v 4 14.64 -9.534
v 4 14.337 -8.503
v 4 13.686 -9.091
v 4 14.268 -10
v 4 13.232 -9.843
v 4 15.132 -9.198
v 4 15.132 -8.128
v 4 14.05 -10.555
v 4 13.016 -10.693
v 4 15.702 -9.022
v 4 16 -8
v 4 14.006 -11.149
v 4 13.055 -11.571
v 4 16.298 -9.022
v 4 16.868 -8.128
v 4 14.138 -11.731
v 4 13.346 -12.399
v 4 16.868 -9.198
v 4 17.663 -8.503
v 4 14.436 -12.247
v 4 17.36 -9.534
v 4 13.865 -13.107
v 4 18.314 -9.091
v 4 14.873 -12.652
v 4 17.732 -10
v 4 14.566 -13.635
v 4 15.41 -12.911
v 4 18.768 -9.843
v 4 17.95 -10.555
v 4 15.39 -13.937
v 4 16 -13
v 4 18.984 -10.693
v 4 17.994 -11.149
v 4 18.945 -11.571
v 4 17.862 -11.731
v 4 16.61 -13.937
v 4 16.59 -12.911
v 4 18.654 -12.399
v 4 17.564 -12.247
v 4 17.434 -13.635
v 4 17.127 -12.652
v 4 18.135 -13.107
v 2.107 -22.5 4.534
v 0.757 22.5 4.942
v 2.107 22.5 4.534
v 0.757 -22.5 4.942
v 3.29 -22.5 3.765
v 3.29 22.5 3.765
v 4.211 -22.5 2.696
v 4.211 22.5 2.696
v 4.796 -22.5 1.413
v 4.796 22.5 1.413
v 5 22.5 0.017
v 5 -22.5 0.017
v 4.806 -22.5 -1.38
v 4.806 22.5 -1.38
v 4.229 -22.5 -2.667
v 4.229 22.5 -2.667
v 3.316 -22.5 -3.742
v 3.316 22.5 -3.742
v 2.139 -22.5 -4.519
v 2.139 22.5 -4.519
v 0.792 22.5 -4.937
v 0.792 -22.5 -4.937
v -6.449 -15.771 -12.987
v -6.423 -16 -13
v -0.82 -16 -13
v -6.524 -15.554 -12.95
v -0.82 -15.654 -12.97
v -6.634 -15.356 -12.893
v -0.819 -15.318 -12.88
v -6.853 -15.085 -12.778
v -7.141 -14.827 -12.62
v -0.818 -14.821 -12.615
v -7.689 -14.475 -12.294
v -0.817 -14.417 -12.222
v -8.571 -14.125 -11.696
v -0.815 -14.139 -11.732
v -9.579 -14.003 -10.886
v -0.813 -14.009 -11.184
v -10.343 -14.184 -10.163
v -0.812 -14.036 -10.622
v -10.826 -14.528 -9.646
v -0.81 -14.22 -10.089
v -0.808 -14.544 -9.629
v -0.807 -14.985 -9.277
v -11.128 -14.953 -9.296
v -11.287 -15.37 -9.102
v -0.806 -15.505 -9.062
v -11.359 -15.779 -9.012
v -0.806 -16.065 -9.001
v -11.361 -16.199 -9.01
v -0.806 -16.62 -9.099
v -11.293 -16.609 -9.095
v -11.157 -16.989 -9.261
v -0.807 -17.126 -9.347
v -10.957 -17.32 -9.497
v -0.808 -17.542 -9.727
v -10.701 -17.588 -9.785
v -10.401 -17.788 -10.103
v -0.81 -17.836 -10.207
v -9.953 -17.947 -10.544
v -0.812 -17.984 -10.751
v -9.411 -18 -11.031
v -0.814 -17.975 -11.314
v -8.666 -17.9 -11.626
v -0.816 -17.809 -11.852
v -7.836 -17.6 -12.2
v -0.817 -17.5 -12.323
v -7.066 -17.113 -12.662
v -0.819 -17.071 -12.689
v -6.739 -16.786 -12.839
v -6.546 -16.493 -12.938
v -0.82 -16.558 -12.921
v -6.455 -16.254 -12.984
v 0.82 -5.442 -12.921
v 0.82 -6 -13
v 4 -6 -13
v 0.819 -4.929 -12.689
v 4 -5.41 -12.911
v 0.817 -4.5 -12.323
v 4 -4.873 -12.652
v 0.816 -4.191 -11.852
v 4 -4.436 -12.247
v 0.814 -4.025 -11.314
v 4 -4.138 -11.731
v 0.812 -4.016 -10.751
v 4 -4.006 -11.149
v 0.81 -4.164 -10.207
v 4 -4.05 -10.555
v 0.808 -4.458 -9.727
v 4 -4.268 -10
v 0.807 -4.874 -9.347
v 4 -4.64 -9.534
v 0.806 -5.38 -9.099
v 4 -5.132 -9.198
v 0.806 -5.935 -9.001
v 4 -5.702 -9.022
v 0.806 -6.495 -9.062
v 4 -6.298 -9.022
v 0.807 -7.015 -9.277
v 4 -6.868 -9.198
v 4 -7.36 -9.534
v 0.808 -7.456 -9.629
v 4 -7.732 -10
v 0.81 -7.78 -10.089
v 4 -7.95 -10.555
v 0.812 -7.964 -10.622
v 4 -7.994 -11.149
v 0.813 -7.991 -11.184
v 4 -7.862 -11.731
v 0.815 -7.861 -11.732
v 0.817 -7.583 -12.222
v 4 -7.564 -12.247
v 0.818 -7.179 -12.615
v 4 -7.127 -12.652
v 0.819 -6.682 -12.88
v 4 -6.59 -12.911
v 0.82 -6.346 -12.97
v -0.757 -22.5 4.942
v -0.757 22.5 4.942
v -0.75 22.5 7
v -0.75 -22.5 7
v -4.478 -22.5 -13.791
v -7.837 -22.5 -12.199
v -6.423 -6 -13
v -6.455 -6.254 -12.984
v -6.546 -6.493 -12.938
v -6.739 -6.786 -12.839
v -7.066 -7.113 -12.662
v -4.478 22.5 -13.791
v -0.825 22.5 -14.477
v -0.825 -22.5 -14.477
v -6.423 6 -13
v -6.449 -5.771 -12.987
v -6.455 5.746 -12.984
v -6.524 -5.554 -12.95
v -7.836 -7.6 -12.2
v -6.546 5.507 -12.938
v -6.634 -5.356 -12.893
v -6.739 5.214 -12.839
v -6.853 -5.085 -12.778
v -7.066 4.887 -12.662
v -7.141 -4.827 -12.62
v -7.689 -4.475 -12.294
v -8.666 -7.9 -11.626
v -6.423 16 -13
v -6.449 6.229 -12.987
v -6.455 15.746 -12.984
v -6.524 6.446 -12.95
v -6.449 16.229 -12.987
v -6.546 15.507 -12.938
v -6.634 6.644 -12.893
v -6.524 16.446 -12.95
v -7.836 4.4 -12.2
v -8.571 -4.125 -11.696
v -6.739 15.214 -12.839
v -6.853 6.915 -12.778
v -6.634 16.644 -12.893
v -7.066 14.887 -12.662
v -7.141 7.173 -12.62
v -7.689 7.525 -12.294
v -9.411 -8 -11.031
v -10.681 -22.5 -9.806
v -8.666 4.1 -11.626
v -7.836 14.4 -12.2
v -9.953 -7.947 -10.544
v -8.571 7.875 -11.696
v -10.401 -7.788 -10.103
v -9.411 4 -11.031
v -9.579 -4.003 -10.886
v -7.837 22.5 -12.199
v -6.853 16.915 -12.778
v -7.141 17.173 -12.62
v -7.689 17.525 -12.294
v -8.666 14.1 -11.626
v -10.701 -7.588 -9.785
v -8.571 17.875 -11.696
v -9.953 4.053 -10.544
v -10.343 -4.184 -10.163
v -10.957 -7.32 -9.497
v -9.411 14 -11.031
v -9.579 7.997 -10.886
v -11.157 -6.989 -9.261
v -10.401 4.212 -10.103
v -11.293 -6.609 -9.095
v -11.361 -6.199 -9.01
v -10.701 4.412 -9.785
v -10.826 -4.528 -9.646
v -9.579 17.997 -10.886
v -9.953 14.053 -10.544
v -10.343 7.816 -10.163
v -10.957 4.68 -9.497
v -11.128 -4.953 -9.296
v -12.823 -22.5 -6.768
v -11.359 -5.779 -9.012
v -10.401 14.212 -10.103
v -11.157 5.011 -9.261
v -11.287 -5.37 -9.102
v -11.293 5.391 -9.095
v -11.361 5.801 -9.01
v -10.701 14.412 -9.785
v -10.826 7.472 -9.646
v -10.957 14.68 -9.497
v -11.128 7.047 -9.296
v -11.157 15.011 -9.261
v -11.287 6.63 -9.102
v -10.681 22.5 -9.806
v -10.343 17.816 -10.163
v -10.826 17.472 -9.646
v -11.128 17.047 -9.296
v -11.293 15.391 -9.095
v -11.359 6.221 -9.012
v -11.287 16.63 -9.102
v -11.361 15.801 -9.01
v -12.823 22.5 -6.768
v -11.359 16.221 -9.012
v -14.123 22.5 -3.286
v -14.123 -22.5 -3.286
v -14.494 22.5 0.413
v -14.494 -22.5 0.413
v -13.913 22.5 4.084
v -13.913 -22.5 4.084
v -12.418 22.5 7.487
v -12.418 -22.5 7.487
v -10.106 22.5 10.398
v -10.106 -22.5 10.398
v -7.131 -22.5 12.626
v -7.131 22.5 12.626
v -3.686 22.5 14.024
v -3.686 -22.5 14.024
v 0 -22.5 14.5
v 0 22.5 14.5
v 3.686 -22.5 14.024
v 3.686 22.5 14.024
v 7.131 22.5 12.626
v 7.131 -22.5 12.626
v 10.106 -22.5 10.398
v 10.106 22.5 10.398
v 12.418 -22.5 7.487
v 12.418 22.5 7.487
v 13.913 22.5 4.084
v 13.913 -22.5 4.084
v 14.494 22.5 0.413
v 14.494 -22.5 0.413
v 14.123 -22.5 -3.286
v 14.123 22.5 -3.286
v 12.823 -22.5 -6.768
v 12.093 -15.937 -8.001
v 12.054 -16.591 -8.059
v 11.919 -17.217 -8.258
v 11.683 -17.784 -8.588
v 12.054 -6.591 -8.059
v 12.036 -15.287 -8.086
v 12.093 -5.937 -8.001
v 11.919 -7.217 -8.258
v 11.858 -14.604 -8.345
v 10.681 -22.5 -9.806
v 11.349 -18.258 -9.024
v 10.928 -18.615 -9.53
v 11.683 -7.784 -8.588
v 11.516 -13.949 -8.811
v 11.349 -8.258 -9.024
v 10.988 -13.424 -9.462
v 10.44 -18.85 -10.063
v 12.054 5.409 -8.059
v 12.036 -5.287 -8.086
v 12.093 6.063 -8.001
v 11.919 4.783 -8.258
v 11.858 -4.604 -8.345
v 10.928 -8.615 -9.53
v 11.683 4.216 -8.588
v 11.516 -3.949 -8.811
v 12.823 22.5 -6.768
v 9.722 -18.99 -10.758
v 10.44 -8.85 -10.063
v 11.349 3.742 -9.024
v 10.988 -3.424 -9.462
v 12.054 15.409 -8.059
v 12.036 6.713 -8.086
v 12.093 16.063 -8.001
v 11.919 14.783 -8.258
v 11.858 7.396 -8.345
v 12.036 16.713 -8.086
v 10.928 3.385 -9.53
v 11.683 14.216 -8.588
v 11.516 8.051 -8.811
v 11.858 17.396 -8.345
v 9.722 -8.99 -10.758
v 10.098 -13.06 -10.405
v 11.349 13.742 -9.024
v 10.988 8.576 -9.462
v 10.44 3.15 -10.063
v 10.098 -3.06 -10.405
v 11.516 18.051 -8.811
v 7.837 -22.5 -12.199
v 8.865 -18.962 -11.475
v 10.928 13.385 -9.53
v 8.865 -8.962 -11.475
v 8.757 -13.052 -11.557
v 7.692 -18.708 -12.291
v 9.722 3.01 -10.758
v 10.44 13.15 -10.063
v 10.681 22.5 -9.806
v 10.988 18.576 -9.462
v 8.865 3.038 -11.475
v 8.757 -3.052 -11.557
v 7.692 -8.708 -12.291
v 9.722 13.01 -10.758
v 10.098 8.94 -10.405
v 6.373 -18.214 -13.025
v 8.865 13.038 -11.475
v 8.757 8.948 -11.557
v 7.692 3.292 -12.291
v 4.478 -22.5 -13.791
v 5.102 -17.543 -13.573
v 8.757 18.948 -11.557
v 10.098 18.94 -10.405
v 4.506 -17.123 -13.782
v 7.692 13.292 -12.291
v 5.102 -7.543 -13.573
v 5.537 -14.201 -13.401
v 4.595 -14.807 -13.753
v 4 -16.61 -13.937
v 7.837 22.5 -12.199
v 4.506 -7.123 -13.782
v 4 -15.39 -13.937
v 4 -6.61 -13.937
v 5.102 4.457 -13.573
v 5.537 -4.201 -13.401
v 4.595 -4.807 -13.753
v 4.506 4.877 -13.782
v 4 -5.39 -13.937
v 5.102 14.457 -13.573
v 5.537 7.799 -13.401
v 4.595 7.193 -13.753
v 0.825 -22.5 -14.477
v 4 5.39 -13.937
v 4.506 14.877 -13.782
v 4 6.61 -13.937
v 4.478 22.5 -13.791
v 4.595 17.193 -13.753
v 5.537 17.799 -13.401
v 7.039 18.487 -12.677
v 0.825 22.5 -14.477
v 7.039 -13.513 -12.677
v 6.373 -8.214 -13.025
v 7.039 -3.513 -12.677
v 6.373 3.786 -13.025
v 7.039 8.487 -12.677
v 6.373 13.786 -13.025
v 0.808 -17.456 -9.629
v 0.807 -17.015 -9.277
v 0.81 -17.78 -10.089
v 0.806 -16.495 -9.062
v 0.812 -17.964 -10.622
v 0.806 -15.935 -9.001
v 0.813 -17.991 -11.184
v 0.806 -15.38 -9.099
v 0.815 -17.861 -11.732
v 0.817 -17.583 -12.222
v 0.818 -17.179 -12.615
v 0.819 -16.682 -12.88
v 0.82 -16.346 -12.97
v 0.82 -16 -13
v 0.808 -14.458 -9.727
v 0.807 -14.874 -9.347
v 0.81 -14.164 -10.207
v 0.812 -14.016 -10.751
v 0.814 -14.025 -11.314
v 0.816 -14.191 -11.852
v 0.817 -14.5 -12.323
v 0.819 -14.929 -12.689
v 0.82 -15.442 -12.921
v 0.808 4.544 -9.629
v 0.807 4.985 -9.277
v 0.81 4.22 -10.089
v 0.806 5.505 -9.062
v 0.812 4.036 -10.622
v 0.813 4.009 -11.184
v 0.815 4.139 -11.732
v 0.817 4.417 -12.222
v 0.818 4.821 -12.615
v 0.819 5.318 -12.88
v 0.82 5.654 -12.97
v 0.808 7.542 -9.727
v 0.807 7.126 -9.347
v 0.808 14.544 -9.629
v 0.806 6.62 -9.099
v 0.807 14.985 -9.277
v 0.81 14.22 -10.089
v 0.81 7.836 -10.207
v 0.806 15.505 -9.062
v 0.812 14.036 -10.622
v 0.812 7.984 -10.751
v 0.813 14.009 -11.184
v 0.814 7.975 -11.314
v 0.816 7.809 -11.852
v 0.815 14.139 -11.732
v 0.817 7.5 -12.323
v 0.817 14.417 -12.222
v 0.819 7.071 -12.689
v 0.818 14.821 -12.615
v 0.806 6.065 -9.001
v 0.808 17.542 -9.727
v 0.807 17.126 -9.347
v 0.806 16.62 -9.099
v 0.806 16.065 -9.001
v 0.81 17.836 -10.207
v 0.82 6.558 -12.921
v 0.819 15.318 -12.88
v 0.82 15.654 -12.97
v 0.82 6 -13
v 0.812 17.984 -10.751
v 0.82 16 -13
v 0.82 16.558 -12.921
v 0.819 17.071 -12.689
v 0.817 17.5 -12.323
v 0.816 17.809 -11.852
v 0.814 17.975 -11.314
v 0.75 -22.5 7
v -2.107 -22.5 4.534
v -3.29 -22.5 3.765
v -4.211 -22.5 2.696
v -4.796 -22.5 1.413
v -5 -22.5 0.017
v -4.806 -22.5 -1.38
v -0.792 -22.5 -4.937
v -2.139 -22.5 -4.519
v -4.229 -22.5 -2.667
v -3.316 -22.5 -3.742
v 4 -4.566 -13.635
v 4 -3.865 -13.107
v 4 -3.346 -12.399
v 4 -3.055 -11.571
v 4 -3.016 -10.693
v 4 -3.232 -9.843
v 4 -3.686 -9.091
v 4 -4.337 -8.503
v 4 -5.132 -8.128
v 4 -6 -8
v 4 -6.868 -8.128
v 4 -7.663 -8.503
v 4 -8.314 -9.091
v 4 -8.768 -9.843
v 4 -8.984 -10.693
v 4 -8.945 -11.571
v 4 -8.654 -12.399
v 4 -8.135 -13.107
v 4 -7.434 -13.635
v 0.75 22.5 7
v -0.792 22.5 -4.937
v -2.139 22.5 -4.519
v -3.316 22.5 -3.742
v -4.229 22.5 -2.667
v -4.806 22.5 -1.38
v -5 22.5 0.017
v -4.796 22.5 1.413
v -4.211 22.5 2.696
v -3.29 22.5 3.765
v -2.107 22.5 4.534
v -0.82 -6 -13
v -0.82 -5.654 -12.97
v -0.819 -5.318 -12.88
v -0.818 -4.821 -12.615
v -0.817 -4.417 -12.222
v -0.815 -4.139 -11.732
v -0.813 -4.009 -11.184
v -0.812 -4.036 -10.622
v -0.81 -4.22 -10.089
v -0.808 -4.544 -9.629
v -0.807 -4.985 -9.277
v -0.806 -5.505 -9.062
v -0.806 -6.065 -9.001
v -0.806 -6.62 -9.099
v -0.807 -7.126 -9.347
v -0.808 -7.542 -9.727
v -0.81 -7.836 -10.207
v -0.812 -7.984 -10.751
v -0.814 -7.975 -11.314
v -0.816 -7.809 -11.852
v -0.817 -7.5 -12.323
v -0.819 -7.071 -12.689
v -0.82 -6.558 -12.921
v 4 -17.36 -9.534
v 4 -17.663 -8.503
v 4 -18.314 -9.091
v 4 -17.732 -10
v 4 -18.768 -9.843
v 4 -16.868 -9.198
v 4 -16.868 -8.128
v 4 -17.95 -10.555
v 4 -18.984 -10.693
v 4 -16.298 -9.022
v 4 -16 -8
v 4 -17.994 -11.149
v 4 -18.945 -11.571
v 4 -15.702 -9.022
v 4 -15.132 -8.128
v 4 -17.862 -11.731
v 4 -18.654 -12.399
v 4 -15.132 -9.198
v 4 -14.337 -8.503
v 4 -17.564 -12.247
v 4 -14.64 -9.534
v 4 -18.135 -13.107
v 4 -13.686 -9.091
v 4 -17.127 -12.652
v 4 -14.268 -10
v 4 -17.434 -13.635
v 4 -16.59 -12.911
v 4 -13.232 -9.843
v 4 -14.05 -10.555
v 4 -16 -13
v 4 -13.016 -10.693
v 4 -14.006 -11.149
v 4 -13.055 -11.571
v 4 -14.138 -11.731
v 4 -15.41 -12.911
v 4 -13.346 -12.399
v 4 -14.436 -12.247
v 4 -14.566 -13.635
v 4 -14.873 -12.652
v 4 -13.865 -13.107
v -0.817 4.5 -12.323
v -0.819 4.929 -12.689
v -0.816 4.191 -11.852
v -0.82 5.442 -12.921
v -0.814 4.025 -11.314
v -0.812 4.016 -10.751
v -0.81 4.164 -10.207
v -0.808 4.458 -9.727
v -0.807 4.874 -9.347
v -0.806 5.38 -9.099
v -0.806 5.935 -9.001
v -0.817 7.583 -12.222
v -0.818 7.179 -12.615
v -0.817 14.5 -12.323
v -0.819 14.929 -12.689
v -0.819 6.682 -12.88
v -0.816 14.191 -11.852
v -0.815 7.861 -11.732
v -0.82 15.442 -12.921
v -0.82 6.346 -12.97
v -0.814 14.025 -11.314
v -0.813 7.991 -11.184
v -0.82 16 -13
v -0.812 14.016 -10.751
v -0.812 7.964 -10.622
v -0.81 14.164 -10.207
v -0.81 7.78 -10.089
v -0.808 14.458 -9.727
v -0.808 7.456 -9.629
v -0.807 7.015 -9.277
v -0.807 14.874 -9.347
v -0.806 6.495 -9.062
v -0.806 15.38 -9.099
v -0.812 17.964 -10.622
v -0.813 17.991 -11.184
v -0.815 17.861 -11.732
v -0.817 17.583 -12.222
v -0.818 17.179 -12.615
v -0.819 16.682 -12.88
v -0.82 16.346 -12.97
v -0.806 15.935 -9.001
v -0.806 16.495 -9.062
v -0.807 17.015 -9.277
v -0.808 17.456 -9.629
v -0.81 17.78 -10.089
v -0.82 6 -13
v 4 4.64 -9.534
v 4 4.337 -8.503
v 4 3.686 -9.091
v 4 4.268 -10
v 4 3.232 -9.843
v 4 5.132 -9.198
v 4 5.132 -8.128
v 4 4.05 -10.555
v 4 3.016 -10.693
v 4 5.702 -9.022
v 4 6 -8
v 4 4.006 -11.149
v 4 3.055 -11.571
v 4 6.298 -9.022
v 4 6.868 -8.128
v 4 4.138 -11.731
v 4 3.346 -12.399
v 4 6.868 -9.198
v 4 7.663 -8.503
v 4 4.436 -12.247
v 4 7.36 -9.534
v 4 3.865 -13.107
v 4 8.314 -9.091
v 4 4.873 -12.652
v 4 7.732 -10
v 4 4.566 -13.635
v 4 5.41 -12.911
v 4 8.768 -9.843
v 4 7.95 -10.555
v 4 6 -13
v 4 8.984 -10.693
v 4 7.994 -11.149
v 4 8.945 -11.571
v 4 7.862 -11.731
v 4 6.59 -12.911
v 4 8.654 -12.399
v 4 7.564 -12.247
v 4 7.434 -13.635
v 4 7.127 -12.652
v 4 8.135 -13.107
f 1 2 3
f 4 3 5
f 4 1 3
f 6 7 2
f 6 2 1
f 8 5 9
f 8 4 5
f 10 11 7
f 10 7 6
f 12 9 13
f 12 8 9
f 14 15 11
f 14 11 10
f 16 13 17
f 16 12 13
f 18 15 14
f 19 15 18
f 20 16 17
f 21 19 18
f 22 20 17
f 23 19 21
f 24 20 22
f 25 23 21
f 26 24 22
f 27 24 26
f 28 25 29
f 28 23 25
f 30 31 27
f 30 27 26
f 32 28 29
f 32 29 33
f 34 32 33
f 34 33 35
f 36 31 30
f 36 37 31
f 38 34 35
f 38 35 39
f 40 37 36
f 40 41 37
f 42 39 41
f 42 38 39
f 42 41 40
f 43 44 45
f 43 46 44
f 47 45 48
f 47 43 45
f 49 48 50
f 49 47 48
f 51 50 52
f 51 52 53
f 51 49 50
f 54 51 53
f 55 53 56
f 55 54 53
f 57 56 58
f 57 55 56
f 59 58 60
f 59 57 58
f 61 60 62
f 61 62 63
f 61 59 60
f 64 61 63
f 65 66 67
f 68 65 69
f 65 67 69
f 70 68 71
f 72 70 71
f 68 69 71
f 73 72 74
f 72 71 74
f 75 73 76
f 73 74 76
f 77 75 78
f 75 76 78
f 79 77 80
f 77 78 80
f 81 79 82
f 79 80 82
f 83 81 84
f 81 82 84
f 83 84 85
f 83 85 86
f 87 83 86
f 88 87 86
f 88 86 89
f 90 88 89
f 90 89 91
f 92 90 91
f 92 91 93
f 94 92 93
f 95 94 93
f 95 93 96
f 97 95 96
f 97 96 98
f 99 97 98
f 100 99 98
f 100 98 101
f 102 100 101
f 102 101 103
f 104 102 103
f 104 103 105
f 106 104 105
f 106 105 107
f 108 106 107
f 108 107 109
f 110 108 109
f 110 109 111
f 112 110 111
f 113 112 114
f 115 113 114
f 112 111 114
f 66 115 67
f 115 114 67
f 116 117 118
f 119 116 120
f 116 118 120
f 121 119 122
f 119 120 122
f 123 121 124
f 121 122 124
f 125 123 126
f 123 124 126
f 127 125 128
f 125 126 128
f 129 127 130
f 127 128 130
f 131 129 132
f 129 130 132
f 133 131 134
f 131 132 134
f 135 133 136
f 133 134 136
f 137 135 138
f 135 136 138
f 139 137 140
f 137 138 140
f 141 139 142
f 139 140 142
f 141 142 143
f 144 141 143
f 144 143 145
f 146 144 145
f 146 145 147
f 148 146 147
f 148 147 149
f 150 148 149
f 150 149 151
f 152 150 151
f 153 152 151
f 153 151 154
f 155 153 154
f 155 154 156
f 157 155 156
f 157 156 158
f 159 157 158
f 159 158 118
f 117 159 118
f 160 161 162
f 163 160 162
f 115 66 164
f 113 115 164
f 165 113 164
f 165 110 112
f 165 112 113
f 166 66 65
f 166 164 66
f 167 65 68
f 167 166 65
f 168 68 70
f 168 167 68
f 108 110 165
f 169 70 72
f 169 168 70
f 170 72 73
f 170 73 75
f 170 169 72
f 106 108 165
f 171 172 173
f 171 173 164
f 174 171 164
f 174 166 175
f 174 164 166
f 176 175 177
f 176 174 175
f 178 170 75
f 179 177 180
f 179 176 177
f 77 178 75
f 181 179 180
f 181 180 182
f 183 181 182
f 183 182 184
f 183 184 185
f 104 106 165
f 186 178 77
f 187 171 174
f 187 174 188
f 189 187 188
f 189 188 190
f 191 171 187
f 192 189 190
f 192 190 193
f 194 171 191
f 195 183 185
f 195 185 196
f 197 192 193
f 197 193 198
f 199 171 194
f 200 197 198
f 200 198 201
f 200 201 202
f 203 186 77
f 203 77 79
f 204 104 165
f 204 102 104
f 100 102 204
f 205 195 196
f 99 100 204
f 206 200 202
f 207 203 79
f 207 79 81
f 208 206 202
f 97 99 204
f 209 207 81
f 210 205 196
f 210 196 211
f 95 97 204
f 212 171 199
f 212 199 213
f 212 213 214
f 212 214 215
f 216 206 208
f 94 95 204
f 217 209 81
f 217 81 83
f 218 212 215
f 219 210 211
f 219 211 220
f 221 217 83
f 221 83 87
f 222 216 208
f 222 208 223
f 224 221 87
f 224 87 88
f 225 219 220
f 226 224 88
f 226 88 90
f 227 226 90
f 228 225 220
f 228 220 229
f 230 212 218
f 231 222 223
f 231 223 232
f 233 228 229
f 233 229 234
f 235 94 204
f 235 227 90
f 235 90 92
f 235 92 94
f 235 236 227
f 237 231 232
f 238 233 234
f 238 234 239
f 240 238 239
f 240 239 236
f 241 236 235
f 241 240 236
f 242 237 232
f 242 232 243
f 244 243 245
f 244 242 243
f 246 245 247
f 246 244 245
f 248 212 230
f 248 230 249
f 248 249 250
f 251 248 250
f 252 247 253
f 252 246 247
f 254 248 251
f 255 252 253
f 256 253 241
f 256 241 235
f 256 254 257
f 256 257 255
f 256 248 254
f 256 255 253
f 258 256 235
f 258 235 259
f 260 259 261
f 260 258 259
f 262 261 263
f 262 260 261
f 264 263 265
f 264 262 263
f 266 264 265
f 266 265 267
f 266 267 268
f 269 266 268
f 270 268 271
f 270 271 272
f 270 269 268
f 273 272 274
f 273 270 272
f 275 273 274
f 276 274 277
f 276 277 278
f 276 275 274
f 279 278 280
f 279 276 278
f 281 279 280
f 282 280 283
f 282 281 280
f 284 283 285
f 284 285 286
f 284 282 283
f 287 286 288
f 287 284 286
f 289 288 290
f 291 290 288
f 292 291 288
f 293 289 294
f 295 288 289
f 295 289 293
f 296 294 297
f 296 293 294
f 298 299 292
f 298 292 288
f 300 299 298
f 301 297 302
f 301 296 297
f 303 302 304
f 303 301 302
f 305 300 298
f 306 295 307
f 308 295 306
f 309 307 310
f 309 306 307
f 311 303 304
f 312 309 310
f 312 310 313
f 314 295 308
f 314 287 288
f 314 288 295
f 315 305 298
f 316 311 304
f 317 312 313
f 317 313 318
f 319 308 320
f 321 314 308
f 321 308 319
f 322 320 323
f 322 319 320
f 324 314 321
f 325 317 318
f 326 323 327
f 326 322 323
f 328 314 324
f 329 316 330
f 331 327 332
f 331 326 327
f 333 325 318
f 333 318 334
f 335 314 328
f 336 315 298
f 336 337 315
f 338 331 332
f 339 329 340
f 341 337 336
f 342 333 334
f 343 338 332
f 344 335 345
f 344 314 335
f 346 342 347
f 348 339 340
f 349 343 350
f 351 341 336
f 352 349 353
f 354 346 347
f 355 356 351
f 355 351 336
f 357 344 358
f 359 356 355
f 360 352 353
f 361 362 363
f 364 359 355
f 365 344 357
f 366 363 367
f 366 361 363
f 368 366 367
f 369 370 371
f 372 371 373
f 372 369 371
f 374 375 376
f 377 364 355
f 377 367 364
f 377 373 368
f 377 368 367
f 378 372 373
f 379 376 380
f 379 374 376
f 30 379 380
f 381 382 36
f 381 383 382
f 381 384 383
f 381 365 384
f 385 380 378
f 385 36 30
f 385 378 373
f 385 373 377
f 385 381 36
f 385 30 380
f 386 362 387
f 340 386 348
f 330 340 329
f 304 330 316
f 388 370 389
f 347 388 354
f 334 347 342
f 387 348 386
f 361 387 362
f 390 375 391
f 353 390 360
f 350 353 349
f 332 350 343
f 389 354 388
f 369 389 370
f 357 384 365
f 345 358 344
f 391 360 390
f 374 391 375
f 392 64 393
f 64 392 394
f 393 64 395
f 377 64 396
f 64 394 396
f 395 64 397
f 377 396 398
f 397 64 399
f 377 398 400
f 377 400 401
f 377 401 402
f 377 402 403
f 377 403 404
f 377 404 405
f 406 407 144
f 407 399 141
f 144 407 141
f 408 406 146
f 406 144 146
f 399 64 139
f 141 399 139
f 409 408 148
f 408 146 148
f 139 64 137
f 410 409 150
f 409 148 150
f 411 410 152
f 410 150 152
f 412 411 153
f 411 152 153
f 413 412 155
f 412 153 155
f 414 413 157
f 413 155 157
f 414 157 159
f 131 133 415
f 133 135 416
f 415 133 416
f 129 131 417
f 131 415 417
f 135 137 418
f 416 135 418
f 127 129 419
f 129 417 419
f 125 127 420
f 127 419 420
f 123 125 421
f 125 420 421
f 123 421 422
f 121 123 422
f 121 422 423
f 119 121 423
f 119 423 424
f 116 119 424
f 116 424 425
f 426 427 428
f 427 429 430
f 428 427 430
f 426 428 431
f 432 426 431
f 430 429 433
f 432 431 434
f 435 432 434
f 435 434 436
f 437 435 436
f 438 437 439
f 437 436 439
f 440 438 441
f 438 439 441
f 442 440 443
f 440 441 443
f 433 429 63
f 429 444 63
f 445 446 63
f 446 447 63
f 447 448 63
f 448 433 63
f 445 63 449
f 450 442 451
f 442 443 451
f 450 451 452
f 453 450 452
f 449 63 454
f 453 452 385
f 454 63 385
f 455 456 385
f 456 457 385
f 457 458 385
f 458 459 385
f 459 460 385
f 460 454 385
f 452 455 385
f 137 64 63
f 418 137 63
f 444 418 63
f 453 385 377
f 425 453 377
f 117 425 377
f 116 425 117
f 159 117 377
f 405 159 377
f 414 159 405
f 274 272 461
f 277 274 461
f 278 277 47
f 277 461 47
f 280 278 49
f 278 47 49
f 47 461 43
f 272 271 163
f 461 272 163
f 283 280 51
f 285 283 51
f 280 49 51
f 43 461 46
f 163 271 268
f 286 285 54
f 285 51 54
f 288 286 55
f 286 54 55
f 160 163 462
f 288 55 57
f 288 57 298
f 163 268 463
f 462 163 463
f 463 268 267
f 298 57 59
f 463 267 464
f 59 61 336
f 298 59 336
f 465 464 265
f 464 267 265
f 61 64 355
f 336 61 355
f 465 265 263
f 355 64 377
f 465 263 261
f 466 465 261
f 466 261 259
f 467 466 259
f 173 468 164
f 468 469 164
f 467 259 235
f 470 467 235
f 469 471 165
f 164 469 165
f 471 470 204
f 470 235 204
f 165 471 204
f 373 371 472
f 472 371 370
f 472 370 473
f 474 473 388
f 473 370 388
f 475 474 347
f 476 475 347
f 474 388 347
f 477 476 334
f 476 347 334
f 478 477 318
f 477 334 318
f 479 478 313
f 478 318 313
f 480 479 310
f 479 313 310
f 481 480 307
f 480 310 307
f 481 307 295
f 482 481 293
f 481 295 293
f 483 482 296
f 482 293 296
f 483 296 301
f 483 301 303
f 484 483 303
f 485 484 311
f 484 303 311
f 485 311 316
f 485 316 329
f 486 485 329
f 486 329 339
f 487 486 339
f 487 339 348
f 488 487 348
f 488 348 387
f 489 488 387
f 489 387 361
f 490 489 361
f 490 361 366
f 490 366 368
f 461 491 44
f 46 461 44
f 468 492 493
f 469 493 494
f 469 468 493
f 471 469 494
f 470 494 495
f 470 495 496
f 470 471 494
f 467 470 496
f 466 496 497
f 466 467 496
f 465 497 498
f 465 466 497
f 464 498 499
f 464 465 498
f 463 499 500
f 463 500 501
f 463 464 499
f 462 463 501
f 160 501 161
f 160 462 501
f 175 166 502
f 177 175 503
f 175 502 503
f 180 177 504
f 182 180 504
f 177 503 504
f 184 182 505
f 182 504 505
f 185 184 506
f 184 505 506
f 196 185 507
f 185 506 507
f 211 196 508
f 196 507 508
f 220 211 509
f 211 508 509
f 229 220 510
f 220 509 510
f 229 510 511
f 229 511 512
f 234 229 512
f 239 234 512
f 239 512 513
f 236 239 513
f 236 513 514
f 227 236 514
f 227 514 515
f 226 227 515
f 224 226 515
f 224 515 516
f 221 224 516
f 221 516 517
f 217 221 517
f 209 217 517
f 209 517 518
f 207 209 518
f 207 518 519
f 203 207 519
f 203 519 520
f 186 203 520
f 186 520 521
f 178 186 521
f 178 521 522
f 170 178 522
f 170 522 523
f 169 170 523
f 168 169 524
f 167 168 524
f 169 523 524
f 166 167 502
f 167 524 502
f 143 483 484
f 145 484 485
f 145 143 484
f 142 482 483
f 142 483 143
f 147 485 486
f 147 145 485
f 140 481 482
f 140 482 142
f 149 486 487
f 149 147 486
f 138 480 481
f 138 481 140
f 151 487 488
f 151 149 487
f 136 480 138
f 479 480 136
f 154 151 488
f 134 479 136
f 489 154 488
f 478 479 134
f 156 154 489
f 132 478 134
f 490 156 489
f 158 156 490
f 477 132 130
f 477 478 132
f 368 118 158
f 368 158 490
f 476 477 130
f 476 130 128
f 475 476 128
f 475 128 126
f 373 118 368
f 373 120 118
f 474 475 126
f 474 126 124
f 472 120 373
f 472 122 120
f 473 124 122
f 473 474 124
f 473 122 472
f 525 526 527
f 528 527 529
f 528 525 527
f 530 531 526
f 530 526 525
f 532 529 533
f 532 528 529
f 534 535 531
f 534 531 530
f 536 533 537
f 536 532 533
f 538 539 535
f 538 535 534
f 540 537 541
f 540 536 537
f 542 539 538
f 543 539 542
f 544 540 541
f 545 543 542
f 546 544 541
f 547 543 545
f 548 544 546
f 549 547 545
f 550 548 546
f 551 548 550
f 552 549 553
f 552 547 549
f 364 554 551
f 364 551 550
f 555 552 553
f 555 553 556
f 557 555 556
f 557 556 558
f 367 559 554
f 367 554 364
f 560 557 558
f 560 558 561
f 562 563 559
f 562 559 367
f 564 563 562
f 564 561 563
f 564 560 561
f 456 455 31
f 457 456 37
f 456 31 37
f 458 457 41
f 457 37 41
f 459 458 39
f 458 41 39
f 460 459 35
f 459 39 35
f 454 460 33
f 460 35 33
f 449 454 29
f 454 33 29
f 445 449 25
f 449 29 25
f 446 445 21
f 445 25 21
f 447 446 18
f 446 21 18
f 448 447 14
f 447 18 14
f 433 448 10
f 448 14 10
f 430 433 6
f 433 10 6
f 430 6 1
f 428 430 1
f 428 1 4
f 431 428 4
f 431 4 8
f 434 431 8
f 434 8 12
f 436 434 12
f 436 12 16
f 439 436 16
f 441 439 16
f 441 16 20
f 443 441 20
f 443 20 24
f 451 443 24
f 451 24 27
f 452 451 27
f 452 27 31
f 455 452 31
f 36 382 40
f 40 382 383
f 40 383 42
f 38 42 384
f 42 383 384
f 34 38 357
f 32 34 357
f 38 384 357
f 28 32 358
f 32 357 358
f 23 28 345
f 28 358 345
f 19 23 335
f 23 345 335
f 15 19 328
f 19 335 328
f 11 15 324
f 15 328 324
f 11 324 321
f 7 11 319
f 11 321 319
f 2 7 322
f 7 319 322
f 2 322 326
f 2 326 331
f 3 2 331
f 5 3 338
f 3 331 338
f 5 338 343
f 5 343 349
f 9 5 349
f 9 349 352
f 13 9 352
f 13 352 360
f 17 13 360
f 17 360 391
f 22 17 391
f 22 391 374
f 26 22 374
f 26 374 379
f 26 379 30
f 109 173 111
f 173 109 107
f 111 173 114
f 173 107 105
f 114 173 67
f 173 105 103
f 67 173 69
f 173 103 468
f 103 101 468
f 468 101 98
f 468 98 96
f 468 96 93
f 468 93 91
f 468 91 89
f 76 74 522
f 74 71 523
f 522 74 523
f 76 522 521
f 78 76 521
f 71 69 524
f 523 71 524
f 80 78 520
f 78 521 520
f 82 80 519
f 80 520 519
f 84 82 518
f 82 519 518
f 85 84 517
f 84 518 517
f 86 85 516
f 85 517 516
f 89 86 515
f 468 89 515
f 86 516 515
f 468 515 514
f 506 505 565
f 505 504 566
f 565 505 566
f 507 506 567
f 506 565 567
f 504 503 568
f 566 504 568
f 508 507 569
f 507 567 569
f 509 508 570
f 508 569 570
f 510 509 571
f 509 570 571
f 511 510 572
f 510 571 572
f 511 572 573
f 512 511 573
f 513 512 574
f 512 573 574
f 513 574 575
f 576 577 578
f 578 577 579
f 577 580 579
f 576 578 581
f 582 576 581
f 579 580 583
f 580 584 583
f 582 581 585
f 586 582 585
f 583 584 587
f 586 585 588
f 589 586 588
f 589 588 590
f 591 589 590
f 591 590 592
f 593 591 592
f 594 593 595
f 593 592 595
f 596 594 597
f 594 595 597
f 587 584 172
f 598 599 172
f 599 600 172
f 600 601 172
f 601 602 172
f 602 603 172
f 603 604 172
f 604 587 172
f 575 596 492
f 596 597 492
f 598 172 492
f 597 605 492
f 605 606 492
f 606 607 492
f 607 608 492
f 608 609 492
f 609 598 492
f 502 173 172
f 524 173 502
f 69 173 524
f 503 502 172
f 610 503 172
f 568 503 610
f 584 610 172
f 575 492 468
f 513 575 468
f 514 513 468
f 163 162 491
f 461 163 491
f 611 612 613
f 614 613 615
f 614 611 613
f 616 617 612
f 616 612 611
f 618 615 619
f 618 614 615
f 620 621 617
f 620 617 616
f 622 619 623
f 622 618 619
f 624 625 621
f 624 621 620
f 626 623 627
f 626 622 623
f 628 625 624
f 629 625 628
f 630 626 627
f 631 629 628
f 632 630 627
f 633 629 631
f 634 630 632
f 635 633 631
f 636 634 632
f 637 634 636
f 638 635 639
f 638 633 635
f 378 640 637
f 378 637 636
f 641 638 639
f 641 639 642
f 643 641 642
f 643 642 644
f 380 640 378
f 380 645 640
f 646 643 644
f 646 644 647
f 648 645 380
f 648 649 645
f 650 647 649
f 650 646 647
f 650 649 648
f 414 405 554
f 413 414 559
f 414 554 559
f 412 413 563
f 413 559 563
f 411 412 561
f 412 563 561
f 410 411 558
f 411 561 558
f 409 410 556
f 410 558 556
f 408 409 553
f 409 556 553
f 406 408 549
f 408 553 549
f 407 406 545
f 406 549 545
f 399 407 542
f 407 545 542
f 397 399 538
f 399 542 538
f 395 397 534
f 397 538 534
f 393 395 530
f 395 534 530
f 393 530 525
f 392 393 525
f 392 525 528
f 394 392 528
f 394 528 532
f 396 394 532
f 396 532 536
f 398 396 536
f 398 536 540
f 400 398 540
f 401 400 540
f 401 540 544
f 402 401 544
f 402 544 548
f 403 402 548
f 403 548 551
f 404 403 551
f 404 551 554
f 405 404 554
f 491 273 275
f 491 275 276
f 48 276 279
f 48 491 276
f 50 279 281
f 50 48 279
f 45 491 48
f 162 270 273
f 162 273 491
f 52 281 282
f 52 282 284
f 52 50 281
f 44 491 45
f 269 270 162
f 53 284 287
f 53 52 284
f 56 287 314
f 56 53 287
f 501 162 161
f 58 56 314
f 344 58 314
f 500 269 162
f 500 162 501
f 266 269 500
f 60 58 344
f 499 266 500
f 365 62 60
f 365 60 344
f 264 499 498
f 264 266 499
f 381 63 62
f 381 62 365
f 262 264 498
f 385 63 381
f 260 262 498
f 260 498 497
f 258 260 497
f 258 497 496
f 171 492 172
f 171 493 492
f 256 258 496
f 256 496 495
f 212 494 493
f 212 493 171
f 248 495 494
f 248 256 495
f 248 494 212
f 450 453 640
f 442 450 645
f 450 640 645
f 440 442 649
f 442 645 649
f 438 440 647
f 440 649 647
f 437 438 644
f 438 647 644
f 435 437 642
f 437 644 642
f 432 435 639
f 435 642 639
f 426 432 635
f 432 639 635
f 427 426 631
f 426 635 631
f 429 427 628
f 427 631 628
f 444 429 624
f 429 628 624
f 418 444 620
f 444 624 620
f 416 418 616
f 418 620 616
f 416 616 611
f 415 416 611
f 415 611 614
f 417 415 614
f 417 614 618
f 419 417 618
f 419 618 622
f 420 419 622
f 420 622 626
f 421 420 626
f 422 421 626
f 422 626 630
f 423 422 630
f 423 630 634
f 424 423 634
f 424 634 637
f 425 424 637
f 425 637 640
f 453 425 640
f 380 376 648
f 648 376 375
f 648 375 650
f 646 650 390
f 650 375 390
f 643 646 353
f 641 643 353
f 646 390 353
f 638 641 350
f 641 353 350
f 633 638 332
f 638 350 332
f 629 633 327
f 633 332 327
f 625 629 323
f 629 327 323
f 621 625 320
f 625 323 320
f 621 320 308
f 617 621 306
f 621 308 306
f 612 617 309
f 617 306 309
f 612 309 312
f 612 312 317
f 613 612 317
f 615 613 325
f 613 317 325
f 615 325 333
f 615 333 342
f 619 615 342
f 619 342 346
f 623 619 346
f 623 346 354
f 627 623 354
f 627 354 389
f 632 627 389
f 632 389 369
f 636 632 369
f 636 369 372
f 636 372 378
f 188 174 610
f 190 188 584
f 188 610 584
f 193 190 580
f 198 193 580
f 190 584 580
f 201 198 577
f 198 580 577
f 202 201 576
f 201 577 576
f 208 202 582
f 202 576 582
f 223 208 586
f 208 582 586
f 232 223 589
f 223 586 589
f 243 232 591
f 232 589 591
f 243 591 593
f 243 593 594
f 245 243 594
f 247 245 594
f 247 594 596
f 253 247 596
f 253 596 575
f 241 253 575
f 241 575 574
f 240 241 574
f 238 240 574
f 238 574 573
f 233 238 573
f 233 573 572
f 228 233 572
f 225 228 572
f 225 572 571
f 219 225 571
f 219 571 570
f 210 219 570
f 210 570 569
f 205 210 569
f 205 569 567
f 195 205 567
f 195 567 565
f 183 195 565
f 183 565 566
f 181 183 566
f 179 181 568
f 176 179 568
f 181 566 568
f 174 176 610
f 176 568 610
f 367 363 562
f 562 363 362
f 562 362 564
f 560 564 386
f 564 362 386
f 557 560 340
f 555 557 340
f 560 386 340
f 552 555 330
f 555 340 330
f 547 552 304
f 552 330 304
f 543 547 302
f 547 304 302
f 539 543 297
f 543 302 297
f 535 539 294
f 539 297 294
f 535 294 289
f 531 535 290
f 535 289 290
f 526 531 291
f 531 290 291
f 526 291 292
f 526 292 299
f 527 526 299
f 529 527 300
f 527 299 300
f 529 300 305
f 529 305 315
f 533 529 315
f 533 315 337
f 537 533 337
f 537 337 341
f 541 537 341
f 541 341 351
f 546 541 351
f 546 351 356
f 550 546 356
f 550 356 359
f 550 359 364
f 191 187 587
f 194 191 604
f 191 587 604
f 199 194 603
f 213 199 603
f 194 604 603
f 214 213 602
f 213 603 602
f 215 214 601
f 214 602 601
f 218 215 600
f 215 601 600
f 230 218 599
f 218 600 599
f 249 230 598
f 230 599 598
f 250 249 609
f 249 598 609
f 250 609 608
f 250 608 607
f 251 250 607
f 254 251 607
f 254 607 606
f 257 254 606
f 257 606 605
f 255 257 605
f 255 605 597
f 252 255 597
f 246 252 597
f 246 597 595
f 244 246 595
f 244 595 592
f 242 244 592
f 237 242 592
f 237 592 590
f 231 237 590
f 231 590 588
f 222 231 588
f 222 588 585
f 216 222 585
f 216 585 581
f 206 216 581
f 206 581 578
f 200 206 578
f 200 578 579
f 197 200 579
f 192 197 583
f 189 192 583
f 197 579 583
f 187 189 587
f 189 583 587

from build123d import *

# Parameters (mm, degrees)
SKETCH1_R           = 14.5
SKETCH1_R_2         = 5
BOSS_EXTRUDE1_DEPTH = 22.5
CUT_EXTRUDE1_START  = -45
CUT_EXTRUDE1_DEPTH  = 45
SKETCH3_R           = 2
CUT_EXTRUDE2_DEPTH  = 40.465174521
SKETCH4_R           = 3
CUT_EXTRUDE3_DEPTH  = 10.5


with BuildPart() as part:
    # Sketch1 → Boss-Extrude1 (new, symmetric)
    with BuildSketch(Plane(origin=(0, 0, 0), x_dir=(1, 0, 0), z_dir=(0, 1, 0))):
        with Locations(Location((0, 0, 0), (0, 0, 90))):
            Circle(SKETCH1_R)
        with Locations(Location((0, 0, 0), (0, 0, 90))):
            Circle(SKETCH1_R_2, mode=Mode.SUBTRACT)
    extrude(amount=BOSS_EXTRUDE1_DEPTH, both=True)

    # Sketch2 → Cut-Extrude1 (cut)
    with BuildSketch(Plane.XZ.offset(22.5).offset(CUT_EXTRUDE1_START)):
        with BuildLine():
            Line((-0.824967477, -14.476513001), (-0.75, 7))
            Line((-0.75, 7), (0.75, 7))
            Line((0.75, 7), (0.824967477, -14.476513001))
            ThreePointArc((0.824967477, -14.476513001), (0, -14.5), (-0.824967477, -14.476513001))
        make_face()
    extrude(amount=CUT_EXTRUDE1_DEPTH, mode=Mode.SUBTRACT)

    # Sketch3 → Cut-Extrude2 (cut, through all)
    with BuildSketch(Plane(origin=(14.5, 0, 0), x_dir=(0, 0, -1), z_dir=(1, 0, 0))):
        with Locations((11, 16)):
            Circle(SKETCH3_R)
        with Locations((11, 6)):
            Circle(SKETCH3_R)
        with Locations((11, -6)):
            Circle(SKETCH3_R)
        with Locations((11, -16)):
            Circle(SKETCH3_R)
    extrude(amount=-CUT_EXTRUDE2_DEPTH, mode=Mode.SUBTRACT)

    # Sketch4 → Cut-Extrude3 (cut)
    with BuildSketch(Plane(origin=(14.5, 0, 0), x_dir=(0, 0, -1), z_dir=(1, 0, 0))):
        with Locations((11, 16)):
            Circle(SKETCH4_R)
        with Locations((11, 6)):
            Circle(SKETCH4_R)
        with Locations((11, -6)):
            Circle(SKETCH4_R)
        with Locations((11, -16)):
            Circle(SKETCH4_R)
    extrude(amount=-CUT_EXTRUDE3_DEPTH, mode=Mode.SUBTRACT)


solid = part.part
